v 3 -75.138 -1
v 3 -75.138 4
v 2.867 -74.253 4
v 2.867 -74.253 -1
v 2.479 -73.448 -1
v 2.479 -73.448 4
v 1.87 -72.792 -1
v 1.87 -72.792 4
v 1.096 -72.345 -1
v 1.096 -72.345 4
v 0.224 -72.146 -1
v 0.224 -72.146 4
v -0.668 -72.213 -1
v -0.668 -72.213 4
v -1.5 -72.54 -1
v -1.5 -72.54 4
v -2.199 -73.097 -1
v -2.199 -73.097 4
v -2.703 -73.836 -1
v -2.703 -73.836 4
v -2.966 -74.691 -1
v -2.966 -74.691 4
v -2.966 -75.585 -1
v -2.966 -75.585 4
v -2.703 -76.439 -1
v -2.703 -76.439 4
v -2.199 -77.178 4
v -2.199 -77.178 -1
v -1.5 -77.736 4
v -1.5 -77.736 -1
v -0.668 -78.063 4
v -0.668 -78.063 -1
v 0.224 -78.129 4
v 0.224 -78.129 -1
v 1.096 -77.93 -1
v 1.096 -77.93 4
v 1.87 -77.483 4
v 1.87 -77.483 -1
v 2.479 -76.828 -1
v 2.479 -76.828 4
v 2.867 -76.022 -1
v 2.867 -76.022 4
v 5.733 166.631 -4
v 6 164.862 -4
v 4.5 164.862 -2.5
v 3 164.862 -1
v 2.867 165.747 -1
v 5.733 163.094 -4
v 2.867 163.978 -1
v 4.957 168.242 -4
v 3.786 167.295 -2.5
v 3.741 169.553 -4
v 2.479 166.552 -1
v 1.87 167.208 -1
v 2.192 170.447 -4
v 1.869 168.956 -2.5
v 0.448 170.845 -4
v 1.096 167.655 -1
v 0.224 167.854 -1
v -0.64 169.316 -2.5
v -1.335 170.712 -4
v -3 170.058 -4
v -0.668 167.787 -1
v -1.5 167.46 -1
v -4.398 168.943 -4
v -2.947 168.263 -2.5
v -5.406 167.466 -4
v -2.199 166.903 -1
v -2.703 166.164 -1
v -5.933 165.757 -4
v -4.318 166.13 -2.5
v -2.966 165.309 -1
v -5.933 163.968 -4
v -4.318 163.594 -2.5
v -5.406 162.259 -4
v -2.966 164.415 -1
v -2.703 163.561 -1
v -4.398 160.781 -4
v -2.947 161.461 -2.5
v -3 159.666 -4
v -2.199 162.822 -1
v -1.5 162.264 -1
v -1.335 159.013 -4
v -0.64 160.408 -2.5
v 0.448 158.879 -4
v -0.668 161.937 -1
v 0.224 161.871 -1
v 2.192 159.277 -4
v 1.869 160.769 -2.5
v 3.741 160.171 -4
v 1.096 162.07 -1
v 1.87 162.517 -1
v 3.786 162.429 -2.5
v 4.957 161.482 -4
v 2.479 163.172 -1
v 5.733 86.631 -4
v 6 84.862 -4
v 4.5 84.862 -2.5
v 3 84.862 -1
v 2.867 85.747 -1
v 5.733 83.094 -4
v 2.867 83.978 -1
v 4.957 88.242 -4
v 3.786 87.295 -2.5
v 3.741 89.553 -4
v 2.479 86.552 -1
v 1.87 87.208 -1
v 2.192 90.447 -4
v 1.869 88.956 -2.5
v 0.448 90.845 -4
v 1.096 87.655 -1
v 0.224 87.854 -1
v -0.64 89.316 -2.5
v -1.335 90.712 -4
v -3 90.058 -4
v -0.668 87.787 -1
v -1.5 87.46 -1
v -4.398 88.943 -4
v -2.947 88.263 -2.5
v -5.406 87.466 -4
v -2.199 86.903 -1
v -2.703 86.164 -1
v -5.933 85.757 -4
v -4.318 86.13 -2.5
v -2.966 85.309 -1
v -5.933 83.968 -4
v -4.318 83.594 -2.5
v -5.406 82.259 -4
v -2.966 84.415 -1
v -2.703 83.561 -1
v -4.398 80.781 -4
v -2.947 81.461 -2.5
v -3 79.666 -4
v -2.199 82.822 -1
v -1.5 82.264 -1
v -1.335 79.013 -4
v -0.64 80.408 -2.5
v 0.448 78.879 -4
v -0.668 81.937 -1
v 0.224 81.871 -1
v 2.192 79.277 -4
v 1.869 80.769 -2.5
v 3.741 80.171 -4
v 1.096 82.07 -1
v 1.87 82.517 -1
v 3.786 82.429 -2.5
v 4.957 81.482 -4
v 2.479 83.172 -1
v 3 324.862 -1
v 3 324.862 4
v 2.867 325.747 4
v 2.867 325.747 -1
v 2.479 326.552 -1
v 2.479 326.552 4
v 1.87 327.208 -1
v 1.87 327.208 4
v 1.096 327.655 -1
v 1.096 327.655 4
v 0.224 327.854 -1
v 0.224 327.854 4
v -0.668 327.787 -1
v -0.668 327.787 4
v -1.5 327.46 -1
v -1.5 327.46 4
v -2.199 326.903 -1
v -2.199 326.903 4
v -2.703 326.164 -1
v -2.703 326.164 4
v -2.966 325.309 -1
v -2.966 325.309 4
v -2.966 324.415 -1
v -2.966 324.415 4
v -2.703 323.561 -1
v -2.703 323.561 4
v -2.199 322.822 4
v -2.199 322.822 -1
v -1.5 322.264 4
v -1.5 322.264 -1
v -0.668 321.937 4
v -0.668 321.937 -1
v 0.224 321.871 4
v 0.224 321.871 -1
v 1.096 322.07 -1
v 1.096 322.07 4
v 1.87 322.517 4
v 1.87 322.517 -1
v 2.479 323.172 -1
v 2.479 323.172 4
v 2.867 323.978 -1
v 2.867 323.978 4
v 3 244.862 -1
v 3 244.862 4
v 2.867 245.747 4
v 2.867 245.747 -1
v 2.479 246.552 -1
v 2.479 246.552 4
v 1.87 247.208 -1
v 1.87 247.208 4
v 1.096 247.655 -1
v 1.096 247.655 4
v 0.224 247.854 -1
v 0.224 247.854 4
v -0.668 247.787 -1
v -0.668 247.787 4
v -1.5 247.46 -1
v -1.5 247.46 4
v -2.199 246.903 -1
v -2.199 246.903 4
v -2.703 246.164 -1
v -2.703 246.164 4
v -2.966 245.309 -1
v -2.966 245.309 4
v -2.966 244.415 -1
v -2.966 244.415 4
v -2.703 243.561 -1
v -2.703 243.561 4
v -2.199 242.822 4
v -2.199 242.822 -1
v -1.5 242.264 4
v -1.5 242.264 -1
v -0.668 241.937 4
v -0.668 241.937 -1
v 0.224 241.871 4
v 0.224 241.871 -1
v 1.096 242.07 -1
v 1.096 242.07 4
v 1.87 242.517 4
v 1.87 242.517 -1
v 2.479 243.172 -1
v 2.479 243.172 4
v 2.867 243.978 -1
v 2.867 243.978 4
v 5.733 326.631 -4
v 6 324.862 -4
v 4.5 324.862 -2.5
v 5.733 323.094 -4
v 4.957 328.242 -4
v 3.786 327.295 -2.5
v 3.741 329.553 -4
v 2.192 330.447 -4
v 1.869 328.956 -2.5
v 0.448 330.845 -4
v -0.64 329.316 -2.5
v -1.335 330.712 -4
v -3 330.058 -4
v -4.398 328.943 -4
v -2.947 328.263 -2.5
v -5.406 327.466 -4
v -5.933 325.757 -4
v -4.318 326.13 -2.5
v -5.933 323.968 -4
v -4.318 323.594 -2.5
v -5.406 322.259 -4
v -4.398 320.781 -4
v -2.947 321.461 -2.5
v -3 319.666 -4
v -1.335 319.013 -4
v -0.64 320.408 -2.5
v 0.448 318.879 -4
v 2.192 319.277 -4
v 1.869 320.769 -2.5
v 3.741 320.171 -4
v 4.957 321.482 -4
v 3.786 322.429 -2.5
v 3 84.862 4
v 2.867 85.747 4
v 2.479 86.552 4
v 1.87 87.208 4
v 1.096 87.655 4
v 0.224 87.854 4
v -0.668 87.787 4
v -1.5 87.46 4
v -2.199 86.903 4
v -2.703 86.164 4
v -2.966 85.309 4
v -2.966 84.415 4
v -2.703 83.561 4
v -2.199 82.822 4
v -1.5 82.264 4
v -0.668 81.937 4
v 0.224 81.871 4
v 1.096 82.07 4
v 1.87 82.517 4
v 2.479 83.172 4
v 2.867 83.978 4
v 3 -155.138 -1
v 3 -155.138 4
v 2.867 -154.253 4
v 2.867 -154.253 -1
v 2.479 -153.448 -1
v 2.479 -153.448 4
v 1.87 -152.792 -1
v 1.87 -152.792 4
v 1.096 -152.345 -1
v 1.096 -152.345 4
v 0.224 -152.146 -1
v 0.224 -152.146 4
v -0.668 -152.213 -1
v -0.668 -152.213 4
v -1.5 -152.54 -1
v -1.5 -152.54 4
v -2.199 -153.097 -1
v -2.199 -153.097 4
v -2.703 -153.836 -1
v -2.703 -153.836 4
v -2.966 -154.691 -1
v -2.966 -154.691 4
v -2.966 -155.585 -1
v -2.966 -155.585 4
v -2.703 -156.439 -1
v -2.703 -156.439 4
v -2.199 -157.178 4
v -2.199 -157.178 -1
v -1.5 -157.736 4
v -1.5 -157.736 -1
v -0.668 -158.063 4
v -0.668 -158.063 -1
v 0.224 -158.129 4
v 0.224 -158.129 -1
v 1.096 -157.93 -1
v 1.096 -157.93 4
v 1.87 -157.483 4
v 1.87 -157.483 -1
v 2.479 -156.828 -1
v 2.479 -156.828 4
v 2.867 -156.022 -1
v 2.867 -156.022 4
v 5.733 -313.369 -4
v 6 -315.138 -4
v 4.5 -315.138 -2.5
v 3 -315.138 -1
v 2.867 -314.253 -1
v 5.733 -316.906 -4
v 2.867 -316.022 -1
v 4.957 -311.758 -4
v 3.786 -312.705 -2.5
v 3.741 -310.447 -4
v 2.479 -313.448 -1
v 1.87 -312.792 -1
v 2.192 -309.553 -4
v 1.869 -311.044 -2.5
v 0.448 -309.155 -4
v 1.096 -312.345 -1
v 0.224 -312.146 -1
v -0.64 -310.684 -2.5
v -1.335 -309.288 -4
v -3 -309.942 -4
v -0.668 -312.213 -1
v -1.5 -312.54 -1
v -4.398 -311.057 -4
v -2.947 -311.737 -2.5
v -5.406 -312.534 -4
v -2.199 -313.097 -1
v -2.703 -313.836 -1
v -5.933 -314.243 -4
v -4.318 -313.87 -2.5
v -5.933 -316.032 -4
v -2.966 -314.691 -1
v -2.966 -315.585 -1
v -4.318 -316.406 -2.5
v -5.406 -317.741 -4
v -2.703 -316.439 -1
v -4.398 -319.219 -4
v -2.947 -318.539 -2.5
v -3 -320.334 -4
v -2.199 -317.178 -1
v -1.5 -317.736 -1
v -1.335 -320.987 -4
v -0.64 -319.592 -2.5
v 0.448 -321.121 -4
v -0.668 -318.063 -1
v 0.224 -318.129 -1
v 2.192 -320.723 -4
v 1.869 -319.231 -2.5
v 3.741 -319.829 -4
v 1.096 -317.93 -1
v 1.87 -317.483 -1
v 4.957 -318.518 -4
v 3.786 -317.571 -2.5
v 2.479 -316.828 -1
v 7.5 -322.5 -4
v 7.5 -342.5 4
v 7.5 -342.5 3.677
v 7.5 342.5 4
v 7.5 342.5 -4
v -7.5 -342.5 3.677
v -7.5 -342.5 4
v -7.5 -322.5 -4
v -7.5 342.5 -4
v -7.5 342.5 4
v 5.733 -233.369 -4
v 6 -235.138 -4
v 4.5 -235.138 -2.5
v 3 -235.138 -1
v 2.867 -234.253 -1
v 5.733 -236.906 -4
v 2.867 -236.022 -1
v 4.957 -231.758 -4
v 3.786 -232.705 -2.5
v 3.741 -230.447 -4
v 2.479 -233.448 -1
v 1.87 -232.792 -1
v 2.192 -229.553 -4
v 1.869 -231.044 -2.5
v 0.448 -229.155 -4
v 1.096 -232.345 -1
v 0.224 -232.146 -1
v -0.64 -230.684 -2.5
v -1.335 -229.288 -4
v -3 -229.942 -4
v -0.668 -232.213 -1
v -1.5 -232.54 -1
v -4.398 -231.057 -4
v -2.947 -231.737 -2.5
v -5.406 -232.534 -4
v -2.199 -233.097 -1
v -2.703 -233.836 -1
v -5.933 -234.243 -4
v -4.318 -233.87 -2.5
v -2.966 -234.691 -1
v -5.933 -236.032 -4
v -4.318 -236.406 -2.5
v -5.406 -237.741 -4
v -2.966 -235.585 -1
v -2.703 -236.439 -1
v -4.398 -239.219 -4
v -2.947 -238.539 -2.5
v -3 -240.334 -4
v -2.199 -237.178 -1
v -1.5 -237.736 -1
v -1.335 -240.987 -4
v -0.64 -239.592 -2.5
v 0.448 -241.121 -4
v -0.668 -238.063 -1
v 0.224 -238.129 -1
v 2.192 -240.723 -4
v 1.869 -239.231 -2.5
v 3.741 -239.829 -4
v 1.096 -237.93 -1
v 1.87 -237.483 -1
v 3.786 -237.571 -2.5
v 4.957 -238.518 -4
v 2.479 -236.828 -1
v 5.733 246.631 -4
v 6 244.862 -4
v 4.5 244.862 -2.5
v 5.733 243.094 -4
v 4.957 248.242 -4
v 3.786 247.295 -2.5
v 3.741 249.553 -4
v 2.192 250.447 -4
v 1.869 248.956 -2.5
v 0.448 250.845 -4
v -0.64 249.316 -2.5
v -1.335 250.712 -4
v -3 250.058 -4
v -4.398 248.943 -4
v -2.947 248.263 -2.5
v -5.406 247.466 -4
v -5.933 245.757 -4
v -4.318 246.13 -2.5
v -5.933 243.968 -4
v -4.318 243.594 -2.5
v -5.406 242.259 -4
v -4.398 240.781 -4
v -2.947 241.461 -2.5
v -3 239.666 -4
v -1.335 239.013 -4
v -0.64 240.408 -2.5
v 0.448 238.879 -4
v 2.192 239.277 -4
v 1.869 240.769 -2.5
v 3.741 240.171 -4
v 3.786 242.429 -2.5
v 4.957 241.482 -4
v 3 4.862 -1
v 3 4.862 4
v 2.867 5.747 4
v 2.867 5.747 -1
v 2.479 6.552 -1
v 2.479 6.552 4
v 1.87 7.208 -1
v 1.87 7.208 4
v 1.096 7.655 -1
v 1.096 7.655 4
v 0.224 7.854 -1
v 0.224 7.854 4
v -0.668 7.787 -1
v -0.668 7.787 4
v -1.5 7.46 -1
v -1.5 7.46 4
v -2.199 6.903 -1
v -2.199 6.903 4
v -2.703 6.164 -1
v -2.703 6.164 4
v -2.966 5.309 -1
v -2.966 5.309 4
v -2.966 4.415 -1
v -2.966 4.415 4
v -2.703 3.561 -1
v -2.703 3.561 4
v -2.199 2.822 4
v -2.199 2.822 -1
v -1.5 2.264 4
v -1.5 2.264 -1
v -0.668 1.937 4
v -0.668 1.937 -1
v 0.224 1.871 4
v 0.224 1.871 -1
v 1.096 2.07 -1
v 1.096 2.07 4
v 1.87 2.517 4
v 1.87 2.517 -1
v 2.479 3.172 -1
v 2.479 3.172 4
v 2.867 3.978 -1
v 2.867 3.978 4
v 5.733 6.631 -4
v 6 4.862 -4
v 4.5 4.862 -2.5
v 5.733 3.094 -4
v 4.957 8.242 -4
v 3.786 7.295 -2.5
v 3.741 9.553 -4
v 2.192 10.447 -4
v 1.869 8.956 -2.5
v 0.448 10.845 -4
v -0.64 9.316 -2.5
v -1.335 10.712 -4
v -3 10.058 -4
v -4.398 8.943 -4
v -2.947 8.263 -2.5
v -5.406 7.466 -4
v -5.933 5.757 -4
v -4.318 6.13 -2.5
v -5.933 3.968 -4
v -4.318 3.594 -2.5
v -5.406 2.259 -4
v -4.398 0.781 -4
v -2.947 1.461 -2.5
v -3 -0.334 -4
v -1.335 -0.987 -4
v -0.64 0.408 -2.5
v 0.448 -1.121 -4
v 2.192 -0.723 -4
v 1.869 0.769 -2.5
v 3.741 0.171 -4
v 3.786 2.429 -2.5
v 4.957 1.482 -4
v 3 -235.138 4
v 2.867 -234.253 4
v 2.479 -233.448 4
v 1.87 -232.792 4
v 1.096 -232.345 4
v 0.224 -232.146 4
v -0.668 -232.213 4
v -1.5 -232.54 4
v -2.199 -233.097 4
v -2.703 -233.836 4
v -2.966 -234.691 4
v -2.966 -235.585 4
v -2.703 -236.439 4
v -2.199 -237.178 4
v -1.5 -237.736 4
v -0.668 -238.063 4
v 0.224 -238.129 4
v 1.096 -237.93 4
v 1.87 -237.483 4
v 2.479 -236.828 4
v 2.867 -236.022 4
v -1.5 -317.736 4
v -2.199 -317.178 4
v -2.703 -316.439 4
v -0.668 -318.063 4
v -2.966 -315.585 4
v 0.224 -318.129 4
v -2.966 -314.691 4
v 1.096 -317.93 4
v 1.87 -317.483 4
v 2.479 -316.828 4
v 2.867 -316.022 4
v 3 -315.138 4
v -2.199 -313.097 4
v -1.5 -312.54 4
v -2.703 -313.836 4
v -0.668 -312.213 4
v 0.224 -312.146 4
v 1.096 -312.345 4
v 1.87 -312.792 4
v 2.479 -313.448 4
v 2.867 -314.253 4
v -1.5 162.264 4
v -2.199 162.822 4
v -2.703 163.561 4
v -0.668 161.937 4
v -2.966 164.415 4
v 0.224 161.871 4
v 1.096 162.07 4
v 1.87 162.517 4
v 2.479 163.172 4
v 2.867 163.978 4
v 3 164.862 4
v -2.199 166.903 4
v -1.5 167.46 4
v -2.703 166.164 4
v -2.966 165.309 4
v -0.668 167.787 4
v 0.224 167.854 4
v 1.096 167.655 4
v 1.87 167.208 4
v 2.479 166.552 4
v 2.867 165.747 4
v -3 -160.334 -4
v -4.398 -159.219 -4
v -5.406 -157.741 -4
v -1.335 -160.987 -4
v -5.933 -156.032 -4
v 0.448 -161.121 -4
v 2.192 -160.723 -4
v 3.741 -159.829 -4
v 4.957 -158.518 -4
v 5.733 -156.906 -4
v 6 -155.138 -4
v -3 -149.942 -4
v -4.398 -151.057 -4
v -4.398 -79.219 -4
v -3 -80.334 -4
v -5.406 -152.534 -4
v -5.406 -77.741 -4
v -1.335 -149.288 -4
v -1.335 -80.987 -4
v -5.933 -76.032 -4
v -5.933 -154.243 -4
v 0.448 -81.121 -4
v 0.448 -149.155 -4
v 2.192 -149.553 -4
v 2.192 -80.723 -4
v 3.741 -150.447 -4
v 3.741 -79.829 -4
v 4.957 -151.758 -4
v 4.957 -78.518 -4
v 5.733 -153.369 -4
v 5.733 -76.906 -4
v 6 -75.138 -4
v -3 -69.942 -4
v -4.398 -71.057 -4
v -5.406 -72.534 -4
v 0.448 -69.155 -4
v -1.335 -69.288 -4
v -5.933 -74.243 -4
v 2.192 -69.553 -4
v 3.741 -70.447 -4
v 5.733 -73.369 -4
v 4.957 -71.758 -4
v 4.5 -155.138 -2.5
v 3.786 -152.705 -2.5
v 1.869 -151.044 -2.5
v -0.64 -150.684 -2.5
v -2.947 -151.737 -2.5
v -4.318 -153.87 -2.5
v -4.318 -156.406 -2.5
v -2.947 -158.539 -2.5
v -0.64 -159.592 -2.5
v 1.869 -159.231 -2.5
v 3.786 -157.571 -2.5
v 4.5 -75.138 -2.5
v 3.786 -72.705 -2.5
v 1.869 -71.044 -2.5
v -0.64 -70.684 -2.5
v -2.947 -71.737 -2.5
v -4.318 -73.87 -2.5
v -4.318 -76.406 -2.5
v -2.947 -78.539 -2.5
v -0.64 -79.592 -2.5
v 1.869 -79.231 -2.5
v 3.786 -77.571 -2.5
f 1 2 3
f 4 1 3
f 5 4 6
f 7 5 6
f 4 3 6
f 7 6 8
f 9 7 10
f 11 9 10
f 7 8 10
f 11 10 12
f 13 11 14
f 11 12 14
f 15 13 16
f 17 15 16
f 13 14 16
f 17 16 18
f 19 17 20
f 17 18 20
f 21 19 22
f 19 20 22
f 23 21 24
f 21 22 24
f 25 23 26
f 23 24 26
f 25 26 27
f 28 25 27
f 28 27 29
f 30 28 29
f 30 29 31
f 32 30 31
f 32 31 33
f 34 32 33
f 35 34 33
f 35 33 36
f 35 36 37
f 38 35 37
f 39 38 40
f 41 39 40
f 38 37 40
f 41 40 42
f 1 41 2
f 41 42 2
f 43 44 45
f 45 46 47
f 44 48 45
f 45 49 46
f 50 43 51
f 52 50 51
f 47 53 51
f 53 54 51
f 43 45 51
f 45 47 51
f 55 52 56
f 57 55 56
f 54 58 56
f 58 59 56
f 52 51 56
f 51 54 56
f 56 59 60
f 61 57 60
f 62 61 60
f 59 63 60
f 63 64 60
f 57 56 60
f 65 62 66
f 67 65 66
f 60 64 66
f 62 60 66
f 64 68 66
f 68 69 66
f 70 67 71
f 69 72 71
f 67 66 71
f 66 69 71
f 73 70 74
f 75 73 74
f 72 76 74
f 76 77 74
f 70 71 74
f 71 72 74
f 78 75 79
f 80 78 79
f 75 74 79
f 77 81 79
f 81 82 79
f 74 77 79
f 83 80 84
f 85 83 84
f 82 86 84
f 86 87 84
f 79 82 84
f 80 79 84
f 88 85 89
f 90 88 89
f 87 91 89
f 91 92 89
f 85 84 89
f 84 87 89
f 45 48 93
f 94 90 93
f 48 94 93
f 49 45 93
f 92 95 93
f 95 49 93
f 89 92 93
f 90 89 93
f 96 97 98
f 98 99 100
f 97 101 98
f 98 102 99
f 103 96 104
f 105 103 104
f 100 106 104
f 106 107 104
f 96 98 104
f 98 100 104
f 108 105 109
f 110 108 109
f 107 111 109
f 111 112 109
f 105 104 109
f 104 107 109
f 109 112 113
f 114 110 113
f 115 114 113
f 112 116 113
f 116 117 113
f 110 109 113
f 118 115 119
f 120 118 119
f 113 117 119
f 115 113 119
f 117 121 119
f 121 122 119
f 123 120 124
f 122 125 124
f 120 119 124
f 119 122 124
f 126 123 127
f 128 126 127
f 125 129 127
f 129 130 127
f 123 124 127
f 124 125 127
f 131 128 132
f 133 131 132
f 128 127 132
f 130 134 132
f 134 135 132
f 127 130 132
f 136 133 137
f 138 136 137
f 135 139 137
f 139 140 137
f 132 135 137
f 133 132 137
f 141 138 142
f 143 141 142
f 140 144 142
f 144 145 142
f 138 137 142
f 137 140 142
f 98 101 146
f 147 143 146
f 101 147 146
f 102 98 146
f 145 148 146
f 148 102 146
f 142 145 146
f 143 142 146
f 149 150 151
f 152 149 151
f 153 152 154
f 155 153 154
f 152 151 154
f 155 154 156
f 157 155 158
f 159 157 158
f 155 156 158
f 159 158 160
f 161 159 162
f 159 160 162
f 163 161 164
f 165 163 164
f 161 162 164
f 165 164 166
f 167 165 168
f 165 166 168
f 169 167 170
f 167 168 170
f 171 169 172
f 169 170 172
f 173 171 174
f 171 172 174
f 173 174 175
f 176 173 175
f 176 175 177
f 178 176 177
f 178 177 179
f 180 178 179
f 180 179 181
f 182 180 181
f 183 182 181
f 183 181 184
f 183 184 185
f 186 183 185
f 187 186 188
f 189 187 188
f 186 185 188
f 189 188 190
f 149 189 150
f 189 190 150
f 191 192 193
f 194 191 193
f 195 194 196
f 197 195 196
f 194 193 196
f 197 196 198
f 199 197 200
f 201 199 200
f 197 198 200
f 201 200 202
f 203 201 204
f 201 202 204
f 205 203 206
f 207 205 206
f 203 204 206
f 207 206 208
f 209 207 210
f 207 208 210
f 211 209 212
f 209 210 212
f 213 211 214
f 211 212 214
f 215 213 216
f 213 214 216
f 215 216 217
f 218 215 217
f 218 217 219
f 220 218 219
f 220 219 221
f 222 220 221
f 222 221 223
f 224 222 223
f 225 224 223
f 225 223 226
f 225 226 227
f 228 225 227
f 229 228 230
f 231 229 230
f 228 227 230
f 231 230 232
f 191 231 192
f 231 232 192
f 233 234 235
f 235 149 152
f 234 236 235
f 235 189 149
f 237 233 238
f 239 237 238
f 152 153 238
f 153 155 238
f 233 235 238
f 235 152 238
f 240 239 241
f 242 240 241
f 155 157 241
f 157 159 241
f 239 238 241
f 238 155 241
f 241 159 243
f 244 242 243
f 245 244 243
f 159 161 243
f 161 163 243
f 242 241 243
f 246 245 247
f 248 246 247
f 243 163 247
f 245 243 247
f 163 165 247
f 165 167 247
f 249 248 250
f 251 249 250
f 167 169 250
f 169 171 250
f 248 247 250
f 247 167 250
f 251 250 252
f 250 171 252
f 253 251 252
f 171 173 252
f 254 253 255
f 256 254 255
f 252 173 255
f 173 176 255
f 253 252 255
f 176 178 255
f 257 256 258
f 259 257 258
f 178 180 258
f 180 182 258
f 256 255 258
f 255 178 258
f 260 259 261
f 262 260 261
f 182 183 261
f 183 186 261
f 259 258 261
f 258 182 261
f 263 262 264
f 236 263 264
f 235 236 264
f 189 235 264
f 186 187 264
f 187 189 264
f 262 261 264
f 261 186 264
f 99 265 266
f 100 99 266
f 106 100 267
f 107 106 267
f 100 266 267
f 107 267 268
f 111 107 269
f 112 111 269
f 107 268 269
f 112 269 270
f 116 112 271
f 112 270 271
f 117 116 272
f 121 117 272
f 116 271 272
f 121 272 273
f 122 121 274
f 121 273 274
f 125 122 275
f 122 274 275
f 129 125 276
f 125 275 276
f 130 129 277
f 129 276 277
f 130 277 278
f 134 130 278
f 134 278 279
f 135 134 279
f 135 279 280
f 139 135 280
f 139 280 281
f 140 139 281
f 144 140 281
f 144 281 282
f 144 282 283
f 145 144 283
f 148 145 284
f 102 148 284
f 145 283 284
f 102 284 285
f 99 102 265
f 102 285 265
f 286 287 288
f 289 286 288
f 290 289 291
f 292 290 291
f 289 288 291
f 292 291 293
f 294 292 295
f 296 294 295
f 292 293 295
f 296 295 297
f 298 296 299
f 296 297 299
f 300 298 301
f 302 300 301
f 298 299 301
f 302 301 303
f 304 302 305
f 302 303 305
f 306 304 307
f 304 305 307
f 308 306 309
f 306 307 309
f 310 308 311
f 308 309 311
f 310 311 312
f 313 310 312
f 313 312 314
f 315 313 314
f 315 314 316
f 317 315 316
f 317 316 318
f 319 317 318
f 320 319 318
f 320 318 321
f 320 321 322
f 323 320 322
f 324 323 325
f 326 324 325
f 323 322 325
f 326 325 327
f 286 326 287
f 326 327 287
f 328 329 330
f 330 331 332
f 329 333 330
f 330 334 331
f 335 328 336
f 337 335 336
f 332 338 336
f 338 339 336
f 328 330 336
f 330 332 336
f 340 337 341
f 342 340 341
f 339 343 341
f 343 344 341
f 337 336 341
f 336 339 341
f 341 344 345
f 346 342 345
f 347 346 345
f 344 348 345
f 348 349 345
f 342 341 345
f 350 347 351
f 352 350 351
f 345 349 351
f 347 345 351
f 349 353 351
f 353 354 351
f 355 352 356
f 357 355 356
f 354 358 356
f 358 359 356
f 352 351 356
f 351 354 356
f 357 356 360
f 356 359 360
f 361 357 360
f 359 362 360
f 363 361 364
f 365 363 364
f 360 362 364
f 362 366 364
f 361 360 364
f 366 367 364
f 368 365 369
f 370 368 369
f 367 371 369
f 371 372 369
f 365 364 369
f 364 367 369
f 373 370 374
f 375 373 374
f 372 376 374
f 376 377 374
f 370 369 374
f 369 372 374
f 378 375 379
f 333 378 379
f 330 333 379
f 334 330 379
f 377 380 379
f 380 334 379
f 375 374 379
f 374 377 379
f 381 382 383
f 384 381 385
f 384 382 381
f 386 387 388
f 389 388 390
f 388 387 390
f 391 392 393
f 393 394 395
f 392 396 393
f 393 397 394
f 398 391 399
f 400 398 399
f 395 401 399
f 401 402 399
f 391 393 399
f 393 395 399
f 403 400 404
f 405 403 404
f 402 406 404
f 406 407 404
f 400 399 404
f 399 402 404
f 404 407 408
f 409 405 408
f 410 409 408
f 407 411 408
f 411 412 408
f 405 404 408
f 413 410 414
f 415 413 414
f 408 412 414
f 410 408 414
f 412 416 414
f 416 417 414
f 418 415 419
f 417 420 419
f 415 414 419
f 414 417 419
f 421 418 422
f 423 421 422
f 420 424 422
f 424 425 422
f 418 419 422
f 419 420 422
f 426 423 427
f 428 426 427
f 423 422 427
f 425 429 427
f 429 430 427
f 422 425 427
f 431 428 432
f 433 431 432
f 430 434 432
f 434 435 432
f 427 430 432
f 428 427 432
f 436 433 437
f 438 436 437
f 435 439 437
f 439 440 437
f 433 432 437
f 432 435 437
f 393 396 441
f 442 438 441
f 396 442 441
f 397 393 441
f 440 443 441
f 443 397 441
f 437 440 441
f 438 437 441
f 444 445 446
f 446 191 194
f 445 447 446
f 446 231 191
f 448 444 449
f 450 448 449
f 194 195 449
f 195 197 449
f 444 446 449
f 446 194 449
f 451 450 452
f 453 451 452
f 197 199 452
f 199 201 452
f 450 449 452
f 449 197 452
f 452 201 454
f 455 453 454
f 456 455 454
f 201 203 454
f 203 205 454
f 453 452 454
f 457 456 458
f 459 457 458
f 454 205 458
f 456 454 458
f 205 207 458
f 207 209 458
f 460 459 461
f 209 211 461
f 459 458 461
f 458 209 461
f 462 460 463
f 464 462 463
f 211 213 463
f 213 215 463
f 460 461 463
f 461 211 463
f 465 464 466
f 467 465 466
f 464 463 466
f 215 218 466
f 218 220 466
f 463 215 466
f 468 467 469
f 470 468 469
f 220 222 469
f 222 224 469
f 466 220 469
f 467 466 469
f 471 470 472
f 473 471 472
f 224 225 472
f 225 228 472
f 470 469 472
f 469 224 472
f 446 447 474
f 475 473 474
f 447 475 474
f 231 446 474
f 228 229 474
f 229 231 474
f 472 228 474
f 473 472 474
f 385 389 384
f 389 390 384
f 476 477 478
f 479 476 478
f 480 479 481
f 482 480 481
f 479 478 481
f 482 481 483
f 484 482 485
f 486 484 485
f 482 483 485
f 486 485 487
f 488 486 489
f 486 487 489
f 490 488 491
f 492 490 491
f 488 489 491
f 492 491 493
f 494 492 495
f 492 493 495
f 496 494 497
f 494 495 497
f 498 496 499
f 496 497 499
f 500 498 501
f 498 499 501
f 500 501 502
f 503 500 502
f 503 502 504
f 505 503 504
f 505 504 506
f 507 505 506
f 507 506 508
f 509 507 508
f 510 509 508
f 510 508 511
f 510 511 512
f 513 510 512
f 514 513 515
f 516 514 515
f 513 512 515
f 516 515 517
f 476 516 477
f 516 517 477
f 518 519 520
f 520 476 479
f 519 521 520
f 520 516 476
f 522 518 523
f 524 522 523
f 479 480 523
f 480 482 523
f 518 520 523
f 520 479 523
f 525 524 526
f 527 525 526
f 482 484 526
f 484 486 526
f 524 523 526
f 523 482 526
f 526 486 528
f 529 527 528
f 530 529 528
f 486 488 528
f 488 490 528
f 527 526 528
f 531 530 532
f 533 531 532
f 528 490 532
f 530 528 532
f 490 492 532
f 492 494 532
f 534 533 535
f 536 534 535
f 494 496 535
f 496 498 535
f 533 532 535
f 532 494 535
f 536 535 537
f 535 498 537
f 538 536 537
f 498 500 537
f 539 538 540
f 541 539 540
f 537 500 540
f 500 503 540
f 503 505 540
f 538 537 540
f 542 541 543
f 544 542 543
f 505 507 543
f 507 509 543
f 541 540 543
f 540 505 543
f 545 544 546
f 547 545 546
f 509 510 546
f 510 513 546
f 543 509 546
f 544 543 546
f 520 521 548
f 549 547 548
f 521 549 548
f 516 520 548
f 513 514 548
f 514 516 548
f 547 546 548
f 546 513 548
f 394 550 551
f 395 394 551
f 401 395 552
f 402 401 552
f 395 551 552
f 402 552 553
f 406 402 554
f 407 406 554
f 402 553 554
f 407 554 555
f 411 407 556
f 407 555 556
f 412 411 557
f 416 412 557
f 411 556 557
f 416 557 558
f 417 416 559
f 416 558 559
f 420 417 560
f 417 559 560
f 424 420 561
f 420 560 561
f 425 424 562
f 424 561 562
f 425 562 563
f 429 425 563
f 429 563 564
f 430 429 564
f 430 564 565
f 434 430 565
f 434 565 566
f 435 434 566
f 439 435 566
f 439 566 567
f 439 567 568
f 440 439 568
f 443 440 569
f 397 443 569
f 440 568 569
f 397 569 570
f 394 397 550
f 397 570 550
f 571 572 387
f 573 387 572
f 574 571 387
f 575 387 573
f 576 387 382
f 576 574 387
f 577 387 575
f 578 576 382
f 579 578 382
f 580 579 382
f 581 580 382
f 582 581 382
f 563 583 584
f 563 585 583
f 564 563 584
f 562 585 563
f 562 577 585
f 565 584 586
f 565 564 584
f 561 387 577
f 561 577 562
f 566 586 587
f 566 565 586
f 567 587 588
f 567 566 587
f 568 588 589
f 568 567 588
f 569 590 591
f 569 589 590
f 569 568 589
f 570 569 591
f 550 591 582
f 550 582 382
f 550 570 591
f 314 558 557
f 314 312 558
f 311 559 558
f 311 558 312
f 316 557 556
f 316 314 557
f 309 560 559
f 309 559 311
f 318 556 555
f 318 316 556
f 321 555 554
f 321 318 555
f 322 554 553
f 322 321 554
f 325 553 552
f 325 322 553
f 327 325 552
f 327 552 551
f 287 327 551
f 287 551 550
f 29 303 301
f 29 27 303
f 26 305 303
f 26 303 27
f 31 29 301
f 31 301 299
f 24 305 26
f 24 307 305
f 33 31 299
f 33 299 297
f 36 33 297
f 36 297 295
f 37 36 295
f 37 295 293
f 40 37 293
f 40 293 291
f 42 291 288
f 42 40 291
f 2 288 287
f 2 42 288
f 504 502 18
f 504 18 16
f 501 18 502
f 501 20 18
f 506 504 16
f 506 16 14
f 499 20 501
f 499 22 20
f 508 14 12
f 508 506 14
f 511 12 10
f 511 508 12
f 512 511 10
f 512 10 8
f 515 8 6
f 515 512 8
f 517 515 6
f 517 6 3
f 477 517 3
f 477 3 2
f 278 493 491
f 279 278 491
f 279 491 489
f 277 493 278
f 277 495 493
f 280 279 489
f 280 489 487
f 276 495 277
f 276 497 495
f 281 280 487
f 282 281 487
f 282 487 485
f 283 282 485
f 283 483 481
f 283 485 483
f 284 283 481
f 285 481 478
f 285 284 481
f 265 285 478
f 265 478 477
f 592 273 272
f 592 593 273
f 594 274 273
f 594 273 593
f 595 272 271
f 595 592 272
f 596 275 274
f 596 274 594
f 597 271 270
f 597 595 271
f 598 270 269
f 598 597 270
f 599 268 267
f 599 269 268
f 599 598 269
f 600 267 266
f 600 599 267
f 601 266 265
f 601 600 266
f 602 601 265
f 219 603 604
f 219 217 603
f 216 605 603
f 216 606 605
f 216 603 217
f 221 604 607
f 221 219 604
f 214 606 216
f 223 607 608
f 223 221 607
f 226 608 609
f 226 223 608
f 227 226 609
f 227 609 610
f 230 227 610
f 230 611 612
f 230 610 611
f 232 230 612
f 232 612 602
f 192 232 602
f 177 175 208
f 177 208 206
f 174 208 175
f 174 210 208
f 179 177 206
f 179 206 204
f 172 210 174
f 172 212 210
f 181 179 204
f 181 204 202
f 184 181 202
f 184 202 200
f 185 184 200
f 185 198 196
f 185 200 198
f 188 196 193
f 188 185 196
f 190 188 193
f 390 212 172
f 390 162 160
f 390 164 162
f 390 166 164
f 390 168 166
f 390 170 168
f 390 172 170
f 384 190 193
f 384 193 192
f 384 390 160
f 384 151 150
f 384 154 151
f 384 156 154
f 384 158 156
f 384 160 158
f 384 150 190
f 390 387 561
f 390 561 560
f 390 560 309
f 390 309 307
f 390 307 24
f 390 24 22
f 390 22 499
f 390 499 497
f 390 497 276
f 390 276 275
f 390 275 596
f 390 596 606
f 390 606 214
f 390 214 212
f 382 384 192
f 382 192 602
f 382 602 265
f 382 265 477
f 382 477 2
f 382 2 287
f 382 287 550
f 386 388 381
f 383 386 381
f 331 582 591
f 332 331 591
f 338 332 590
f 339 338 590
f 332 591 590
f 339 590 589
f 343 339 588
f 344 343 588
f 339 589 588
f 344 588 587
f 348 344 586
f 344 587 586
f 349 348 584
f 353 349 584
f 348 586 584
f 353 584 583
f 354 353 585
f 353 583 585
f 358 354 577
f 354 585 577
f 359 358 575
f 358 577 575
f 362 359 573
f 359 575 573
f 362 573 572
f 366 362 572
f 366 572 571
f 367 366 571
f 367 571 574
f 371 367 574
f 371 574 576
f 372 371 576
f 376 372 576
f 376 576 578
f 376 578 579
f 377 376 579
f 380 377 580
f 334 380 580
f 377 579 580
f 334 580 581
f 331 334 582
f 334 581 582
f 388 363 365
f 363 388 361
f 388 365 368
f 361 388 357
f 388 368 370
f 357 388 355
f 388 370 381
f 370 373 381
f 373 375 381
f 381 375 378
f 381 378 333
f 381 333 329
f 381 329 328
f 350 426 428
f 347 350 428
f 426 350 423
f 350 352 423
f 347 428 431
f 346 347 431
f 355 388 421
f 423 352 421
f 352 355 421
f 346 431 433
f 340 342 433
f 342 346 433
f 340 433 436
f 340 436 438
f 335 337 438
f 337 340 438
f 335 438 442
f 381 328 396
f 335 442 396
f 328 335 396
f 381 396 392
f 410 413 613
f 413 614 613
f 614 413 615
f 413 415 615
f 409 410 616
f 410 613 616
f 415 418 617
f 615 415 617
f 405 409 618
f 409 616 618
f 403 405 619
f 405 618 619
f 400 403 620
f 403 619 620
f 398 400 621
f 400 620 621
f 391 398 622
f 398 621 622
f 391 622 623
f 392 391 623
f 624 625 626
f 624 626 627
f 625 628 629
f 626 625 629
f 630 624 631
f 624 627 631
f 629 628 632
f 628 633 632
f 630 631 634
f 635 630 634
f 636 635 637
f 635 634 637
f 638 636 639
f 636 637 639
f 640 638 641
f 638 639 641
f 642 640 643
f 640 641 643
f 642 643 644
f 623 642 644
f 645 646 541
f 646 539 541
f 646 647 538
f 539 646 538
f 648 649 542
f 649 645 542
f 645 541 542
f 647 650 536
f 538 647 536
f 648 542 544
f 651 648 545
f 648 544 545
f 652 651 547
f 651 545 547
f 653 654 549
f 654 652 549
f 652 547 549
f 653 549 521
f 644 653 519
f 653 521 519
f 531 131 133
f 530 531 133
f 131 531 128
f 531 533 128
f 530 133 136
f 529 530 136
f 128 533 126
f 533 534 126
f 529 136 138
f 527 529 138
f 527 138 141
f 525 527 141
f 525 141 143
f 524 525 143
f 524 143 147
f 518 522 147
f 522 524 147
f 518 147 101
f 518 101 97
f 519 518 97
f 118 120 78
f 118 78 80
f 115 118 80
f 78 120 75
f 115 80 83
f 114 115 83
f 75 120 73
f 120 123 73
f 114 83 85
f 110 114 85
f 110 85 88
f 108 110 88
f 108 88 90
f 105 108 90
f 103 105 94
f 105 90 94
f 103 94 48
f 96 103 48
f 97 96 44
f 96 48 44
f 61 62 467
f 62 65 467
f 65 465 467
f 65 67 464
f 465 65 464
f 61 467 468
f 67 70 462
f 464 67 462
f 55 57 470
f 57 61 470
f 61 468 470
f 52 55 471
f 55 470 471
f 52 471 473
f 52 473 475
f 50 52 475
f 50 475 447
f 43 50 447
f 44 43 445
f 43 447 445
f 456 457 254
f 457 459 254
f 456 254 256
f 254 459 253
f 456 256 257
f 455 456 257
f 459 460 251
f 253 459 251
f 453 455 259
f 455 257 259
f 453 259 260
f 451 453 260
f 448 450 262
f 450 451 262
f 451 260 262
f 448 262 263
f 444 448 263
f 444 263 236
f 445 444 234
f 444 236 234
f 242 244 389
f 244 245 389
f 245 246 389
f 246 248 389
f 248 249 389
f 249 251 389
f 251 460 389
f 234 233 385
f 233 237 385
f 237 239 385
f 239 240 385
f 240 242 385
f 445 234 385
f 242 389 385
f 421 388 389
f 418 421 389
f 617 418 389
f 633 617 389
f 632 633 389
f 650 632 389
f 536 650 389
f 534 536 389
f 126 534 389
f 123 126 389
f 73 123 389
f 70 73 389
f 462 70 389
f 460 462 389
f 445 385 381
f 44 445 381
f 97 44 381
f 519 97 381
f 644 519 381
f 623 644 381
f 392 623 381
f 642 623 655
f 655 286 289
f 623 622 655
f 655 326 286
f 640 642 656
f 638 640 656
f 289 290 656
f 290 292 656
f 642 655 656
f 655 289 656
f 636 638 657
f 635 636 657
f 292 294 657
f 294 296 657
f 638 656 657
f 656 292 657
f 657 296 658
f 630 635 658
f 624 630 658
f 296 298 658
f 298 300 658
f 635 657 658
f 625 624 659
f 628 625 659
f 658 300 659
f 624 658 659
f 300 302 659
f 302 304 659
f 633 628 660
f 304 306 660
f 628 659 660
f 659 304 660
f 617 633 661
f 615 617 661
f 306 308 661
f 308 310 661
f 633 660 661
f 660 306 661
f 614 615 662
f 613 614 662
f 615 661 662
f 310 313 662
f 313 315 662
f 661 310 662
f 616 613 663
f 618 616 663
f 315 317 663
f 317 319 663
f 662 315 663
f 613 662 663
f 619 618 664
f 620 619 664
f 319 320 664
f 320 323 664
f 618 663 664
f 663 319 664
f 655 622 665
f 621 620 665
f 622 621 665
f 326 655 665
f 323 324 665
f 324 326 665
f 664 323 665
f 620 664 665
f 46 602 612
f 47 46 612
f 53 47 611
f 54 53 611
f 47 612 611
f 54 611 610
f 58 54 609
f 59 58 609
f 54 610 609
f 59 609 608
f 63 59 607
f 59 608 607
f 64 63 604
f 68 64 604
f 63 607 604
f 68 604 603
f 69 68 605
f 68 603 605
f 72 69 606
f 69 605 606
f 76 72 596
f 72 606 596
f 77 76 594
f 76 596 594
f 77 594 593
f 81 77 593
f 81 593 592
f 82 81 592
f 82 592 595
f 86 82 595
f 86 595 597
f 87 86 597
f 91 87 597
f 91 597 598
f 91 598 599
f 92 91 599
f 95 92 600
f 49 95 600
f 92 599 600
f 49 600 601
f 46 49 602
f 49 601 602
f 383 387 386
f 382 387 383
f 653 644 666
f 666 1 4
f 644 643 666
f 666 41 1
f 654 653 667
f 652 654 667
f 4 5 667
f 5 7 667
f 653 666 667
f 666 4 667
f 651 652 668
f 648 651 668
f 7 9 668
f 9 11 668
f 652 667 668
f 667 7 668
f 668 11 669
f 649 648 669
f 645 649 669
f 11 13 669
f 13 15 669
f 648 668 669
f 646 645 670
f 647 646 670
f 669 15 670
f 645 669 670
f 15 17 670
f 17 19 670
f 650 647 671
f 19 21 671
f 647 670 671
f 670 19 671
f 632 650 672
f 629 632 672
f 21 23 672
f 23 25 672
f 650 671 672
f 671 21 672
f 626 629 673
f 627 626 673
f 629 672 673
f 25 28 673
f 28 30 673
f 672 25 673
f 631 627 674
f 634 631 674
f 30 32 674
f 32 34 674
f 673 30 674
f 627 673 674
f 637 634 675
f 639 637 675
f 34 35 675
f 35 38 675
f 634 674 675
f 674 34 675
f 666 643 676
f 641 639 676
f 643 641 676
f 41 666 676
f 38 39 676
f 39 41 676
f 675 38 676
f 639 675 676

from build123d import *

# Parameters (mm, degrees)
SKETCH1_W           = 15
SKETCH1_H           = 685
BOSS_EXTRUDE1_DEPTH = 4
SKETCH2_R           = 3
CUT_EXTRUDE1_DEPTH  = 8
CHAMFER1_SIZE       = 20
CHAMFER1_SIZE2      = 7.677280701
LPATTERN1_COUNT     = 9
LPATTERN1_PITCH     = 80
CHAMFER2_SIZE       = 3


with BuildPart() as part:
    # Sketch1 → Boss-Extrude1 (new, symmetric)
    with BuildSketch(Plane.XY):
        Rectangle(SKETCH1_W, SKETCH1_H)
    extrude(amount=BOSS_EXTRUDE1_DEPTH, both=True)

    # Sketch2 → Cut-Extrude1 (cut)
    with BuildSketch(Plane.XY.offset(4)):
        with Locations((0, 324.86225561)):
            Circle(SKETCH2_R)
    cut_extrude1 = extrude(amount=-CUT_EXTRUDE1_DEPTH, mode=Mode.SUBTRACT)

    # Chamfer1
    chamfer1_edges = [part.edges().sort_by_distance(p)[0] for p in [
        (0, -342.5, -4),
    ]]
    chamfer1_side = [part.faces().sort_by_distance(p)[0] for p in [
        (0, -0.896409661, -4),
    ]]
    chamfer(chamfer1_edges, length=CHAMFER1_SIZE, length2=CHAMFER1_SIZE2, reference=chamfer1_side[0])

    # LPattern1: Cut-Extrude1 ×9
    with Locations(*[(0, -i * LPATTERN1_PITCH, 0) for i in range(1, LPATTERN1_COUNT)]):
        add(cut_extrude1, mode=Mode.SUBTRACT)

    # Chamfer2
    chamfer2_edges = [part.edges().sort_by_distance(p)[0] for p in [
        (-3, 324.86225561, -4),
        (-3, 244.86225561, -4),
        (-3, 164.86225561, -4),
        (-3, 84.86225561, -4),
        (-3, 4.86225561, -4),
        (-3, -75.13774439, -4),
        (-3, -155.13774439, -4),
        (-3, -235.13774439, -4),
        (-3, -315.13774439, -4),
    ]]
    chamfer(chamfer2_edges, length=CHAMFER2_SIZE)


solid = part.part
